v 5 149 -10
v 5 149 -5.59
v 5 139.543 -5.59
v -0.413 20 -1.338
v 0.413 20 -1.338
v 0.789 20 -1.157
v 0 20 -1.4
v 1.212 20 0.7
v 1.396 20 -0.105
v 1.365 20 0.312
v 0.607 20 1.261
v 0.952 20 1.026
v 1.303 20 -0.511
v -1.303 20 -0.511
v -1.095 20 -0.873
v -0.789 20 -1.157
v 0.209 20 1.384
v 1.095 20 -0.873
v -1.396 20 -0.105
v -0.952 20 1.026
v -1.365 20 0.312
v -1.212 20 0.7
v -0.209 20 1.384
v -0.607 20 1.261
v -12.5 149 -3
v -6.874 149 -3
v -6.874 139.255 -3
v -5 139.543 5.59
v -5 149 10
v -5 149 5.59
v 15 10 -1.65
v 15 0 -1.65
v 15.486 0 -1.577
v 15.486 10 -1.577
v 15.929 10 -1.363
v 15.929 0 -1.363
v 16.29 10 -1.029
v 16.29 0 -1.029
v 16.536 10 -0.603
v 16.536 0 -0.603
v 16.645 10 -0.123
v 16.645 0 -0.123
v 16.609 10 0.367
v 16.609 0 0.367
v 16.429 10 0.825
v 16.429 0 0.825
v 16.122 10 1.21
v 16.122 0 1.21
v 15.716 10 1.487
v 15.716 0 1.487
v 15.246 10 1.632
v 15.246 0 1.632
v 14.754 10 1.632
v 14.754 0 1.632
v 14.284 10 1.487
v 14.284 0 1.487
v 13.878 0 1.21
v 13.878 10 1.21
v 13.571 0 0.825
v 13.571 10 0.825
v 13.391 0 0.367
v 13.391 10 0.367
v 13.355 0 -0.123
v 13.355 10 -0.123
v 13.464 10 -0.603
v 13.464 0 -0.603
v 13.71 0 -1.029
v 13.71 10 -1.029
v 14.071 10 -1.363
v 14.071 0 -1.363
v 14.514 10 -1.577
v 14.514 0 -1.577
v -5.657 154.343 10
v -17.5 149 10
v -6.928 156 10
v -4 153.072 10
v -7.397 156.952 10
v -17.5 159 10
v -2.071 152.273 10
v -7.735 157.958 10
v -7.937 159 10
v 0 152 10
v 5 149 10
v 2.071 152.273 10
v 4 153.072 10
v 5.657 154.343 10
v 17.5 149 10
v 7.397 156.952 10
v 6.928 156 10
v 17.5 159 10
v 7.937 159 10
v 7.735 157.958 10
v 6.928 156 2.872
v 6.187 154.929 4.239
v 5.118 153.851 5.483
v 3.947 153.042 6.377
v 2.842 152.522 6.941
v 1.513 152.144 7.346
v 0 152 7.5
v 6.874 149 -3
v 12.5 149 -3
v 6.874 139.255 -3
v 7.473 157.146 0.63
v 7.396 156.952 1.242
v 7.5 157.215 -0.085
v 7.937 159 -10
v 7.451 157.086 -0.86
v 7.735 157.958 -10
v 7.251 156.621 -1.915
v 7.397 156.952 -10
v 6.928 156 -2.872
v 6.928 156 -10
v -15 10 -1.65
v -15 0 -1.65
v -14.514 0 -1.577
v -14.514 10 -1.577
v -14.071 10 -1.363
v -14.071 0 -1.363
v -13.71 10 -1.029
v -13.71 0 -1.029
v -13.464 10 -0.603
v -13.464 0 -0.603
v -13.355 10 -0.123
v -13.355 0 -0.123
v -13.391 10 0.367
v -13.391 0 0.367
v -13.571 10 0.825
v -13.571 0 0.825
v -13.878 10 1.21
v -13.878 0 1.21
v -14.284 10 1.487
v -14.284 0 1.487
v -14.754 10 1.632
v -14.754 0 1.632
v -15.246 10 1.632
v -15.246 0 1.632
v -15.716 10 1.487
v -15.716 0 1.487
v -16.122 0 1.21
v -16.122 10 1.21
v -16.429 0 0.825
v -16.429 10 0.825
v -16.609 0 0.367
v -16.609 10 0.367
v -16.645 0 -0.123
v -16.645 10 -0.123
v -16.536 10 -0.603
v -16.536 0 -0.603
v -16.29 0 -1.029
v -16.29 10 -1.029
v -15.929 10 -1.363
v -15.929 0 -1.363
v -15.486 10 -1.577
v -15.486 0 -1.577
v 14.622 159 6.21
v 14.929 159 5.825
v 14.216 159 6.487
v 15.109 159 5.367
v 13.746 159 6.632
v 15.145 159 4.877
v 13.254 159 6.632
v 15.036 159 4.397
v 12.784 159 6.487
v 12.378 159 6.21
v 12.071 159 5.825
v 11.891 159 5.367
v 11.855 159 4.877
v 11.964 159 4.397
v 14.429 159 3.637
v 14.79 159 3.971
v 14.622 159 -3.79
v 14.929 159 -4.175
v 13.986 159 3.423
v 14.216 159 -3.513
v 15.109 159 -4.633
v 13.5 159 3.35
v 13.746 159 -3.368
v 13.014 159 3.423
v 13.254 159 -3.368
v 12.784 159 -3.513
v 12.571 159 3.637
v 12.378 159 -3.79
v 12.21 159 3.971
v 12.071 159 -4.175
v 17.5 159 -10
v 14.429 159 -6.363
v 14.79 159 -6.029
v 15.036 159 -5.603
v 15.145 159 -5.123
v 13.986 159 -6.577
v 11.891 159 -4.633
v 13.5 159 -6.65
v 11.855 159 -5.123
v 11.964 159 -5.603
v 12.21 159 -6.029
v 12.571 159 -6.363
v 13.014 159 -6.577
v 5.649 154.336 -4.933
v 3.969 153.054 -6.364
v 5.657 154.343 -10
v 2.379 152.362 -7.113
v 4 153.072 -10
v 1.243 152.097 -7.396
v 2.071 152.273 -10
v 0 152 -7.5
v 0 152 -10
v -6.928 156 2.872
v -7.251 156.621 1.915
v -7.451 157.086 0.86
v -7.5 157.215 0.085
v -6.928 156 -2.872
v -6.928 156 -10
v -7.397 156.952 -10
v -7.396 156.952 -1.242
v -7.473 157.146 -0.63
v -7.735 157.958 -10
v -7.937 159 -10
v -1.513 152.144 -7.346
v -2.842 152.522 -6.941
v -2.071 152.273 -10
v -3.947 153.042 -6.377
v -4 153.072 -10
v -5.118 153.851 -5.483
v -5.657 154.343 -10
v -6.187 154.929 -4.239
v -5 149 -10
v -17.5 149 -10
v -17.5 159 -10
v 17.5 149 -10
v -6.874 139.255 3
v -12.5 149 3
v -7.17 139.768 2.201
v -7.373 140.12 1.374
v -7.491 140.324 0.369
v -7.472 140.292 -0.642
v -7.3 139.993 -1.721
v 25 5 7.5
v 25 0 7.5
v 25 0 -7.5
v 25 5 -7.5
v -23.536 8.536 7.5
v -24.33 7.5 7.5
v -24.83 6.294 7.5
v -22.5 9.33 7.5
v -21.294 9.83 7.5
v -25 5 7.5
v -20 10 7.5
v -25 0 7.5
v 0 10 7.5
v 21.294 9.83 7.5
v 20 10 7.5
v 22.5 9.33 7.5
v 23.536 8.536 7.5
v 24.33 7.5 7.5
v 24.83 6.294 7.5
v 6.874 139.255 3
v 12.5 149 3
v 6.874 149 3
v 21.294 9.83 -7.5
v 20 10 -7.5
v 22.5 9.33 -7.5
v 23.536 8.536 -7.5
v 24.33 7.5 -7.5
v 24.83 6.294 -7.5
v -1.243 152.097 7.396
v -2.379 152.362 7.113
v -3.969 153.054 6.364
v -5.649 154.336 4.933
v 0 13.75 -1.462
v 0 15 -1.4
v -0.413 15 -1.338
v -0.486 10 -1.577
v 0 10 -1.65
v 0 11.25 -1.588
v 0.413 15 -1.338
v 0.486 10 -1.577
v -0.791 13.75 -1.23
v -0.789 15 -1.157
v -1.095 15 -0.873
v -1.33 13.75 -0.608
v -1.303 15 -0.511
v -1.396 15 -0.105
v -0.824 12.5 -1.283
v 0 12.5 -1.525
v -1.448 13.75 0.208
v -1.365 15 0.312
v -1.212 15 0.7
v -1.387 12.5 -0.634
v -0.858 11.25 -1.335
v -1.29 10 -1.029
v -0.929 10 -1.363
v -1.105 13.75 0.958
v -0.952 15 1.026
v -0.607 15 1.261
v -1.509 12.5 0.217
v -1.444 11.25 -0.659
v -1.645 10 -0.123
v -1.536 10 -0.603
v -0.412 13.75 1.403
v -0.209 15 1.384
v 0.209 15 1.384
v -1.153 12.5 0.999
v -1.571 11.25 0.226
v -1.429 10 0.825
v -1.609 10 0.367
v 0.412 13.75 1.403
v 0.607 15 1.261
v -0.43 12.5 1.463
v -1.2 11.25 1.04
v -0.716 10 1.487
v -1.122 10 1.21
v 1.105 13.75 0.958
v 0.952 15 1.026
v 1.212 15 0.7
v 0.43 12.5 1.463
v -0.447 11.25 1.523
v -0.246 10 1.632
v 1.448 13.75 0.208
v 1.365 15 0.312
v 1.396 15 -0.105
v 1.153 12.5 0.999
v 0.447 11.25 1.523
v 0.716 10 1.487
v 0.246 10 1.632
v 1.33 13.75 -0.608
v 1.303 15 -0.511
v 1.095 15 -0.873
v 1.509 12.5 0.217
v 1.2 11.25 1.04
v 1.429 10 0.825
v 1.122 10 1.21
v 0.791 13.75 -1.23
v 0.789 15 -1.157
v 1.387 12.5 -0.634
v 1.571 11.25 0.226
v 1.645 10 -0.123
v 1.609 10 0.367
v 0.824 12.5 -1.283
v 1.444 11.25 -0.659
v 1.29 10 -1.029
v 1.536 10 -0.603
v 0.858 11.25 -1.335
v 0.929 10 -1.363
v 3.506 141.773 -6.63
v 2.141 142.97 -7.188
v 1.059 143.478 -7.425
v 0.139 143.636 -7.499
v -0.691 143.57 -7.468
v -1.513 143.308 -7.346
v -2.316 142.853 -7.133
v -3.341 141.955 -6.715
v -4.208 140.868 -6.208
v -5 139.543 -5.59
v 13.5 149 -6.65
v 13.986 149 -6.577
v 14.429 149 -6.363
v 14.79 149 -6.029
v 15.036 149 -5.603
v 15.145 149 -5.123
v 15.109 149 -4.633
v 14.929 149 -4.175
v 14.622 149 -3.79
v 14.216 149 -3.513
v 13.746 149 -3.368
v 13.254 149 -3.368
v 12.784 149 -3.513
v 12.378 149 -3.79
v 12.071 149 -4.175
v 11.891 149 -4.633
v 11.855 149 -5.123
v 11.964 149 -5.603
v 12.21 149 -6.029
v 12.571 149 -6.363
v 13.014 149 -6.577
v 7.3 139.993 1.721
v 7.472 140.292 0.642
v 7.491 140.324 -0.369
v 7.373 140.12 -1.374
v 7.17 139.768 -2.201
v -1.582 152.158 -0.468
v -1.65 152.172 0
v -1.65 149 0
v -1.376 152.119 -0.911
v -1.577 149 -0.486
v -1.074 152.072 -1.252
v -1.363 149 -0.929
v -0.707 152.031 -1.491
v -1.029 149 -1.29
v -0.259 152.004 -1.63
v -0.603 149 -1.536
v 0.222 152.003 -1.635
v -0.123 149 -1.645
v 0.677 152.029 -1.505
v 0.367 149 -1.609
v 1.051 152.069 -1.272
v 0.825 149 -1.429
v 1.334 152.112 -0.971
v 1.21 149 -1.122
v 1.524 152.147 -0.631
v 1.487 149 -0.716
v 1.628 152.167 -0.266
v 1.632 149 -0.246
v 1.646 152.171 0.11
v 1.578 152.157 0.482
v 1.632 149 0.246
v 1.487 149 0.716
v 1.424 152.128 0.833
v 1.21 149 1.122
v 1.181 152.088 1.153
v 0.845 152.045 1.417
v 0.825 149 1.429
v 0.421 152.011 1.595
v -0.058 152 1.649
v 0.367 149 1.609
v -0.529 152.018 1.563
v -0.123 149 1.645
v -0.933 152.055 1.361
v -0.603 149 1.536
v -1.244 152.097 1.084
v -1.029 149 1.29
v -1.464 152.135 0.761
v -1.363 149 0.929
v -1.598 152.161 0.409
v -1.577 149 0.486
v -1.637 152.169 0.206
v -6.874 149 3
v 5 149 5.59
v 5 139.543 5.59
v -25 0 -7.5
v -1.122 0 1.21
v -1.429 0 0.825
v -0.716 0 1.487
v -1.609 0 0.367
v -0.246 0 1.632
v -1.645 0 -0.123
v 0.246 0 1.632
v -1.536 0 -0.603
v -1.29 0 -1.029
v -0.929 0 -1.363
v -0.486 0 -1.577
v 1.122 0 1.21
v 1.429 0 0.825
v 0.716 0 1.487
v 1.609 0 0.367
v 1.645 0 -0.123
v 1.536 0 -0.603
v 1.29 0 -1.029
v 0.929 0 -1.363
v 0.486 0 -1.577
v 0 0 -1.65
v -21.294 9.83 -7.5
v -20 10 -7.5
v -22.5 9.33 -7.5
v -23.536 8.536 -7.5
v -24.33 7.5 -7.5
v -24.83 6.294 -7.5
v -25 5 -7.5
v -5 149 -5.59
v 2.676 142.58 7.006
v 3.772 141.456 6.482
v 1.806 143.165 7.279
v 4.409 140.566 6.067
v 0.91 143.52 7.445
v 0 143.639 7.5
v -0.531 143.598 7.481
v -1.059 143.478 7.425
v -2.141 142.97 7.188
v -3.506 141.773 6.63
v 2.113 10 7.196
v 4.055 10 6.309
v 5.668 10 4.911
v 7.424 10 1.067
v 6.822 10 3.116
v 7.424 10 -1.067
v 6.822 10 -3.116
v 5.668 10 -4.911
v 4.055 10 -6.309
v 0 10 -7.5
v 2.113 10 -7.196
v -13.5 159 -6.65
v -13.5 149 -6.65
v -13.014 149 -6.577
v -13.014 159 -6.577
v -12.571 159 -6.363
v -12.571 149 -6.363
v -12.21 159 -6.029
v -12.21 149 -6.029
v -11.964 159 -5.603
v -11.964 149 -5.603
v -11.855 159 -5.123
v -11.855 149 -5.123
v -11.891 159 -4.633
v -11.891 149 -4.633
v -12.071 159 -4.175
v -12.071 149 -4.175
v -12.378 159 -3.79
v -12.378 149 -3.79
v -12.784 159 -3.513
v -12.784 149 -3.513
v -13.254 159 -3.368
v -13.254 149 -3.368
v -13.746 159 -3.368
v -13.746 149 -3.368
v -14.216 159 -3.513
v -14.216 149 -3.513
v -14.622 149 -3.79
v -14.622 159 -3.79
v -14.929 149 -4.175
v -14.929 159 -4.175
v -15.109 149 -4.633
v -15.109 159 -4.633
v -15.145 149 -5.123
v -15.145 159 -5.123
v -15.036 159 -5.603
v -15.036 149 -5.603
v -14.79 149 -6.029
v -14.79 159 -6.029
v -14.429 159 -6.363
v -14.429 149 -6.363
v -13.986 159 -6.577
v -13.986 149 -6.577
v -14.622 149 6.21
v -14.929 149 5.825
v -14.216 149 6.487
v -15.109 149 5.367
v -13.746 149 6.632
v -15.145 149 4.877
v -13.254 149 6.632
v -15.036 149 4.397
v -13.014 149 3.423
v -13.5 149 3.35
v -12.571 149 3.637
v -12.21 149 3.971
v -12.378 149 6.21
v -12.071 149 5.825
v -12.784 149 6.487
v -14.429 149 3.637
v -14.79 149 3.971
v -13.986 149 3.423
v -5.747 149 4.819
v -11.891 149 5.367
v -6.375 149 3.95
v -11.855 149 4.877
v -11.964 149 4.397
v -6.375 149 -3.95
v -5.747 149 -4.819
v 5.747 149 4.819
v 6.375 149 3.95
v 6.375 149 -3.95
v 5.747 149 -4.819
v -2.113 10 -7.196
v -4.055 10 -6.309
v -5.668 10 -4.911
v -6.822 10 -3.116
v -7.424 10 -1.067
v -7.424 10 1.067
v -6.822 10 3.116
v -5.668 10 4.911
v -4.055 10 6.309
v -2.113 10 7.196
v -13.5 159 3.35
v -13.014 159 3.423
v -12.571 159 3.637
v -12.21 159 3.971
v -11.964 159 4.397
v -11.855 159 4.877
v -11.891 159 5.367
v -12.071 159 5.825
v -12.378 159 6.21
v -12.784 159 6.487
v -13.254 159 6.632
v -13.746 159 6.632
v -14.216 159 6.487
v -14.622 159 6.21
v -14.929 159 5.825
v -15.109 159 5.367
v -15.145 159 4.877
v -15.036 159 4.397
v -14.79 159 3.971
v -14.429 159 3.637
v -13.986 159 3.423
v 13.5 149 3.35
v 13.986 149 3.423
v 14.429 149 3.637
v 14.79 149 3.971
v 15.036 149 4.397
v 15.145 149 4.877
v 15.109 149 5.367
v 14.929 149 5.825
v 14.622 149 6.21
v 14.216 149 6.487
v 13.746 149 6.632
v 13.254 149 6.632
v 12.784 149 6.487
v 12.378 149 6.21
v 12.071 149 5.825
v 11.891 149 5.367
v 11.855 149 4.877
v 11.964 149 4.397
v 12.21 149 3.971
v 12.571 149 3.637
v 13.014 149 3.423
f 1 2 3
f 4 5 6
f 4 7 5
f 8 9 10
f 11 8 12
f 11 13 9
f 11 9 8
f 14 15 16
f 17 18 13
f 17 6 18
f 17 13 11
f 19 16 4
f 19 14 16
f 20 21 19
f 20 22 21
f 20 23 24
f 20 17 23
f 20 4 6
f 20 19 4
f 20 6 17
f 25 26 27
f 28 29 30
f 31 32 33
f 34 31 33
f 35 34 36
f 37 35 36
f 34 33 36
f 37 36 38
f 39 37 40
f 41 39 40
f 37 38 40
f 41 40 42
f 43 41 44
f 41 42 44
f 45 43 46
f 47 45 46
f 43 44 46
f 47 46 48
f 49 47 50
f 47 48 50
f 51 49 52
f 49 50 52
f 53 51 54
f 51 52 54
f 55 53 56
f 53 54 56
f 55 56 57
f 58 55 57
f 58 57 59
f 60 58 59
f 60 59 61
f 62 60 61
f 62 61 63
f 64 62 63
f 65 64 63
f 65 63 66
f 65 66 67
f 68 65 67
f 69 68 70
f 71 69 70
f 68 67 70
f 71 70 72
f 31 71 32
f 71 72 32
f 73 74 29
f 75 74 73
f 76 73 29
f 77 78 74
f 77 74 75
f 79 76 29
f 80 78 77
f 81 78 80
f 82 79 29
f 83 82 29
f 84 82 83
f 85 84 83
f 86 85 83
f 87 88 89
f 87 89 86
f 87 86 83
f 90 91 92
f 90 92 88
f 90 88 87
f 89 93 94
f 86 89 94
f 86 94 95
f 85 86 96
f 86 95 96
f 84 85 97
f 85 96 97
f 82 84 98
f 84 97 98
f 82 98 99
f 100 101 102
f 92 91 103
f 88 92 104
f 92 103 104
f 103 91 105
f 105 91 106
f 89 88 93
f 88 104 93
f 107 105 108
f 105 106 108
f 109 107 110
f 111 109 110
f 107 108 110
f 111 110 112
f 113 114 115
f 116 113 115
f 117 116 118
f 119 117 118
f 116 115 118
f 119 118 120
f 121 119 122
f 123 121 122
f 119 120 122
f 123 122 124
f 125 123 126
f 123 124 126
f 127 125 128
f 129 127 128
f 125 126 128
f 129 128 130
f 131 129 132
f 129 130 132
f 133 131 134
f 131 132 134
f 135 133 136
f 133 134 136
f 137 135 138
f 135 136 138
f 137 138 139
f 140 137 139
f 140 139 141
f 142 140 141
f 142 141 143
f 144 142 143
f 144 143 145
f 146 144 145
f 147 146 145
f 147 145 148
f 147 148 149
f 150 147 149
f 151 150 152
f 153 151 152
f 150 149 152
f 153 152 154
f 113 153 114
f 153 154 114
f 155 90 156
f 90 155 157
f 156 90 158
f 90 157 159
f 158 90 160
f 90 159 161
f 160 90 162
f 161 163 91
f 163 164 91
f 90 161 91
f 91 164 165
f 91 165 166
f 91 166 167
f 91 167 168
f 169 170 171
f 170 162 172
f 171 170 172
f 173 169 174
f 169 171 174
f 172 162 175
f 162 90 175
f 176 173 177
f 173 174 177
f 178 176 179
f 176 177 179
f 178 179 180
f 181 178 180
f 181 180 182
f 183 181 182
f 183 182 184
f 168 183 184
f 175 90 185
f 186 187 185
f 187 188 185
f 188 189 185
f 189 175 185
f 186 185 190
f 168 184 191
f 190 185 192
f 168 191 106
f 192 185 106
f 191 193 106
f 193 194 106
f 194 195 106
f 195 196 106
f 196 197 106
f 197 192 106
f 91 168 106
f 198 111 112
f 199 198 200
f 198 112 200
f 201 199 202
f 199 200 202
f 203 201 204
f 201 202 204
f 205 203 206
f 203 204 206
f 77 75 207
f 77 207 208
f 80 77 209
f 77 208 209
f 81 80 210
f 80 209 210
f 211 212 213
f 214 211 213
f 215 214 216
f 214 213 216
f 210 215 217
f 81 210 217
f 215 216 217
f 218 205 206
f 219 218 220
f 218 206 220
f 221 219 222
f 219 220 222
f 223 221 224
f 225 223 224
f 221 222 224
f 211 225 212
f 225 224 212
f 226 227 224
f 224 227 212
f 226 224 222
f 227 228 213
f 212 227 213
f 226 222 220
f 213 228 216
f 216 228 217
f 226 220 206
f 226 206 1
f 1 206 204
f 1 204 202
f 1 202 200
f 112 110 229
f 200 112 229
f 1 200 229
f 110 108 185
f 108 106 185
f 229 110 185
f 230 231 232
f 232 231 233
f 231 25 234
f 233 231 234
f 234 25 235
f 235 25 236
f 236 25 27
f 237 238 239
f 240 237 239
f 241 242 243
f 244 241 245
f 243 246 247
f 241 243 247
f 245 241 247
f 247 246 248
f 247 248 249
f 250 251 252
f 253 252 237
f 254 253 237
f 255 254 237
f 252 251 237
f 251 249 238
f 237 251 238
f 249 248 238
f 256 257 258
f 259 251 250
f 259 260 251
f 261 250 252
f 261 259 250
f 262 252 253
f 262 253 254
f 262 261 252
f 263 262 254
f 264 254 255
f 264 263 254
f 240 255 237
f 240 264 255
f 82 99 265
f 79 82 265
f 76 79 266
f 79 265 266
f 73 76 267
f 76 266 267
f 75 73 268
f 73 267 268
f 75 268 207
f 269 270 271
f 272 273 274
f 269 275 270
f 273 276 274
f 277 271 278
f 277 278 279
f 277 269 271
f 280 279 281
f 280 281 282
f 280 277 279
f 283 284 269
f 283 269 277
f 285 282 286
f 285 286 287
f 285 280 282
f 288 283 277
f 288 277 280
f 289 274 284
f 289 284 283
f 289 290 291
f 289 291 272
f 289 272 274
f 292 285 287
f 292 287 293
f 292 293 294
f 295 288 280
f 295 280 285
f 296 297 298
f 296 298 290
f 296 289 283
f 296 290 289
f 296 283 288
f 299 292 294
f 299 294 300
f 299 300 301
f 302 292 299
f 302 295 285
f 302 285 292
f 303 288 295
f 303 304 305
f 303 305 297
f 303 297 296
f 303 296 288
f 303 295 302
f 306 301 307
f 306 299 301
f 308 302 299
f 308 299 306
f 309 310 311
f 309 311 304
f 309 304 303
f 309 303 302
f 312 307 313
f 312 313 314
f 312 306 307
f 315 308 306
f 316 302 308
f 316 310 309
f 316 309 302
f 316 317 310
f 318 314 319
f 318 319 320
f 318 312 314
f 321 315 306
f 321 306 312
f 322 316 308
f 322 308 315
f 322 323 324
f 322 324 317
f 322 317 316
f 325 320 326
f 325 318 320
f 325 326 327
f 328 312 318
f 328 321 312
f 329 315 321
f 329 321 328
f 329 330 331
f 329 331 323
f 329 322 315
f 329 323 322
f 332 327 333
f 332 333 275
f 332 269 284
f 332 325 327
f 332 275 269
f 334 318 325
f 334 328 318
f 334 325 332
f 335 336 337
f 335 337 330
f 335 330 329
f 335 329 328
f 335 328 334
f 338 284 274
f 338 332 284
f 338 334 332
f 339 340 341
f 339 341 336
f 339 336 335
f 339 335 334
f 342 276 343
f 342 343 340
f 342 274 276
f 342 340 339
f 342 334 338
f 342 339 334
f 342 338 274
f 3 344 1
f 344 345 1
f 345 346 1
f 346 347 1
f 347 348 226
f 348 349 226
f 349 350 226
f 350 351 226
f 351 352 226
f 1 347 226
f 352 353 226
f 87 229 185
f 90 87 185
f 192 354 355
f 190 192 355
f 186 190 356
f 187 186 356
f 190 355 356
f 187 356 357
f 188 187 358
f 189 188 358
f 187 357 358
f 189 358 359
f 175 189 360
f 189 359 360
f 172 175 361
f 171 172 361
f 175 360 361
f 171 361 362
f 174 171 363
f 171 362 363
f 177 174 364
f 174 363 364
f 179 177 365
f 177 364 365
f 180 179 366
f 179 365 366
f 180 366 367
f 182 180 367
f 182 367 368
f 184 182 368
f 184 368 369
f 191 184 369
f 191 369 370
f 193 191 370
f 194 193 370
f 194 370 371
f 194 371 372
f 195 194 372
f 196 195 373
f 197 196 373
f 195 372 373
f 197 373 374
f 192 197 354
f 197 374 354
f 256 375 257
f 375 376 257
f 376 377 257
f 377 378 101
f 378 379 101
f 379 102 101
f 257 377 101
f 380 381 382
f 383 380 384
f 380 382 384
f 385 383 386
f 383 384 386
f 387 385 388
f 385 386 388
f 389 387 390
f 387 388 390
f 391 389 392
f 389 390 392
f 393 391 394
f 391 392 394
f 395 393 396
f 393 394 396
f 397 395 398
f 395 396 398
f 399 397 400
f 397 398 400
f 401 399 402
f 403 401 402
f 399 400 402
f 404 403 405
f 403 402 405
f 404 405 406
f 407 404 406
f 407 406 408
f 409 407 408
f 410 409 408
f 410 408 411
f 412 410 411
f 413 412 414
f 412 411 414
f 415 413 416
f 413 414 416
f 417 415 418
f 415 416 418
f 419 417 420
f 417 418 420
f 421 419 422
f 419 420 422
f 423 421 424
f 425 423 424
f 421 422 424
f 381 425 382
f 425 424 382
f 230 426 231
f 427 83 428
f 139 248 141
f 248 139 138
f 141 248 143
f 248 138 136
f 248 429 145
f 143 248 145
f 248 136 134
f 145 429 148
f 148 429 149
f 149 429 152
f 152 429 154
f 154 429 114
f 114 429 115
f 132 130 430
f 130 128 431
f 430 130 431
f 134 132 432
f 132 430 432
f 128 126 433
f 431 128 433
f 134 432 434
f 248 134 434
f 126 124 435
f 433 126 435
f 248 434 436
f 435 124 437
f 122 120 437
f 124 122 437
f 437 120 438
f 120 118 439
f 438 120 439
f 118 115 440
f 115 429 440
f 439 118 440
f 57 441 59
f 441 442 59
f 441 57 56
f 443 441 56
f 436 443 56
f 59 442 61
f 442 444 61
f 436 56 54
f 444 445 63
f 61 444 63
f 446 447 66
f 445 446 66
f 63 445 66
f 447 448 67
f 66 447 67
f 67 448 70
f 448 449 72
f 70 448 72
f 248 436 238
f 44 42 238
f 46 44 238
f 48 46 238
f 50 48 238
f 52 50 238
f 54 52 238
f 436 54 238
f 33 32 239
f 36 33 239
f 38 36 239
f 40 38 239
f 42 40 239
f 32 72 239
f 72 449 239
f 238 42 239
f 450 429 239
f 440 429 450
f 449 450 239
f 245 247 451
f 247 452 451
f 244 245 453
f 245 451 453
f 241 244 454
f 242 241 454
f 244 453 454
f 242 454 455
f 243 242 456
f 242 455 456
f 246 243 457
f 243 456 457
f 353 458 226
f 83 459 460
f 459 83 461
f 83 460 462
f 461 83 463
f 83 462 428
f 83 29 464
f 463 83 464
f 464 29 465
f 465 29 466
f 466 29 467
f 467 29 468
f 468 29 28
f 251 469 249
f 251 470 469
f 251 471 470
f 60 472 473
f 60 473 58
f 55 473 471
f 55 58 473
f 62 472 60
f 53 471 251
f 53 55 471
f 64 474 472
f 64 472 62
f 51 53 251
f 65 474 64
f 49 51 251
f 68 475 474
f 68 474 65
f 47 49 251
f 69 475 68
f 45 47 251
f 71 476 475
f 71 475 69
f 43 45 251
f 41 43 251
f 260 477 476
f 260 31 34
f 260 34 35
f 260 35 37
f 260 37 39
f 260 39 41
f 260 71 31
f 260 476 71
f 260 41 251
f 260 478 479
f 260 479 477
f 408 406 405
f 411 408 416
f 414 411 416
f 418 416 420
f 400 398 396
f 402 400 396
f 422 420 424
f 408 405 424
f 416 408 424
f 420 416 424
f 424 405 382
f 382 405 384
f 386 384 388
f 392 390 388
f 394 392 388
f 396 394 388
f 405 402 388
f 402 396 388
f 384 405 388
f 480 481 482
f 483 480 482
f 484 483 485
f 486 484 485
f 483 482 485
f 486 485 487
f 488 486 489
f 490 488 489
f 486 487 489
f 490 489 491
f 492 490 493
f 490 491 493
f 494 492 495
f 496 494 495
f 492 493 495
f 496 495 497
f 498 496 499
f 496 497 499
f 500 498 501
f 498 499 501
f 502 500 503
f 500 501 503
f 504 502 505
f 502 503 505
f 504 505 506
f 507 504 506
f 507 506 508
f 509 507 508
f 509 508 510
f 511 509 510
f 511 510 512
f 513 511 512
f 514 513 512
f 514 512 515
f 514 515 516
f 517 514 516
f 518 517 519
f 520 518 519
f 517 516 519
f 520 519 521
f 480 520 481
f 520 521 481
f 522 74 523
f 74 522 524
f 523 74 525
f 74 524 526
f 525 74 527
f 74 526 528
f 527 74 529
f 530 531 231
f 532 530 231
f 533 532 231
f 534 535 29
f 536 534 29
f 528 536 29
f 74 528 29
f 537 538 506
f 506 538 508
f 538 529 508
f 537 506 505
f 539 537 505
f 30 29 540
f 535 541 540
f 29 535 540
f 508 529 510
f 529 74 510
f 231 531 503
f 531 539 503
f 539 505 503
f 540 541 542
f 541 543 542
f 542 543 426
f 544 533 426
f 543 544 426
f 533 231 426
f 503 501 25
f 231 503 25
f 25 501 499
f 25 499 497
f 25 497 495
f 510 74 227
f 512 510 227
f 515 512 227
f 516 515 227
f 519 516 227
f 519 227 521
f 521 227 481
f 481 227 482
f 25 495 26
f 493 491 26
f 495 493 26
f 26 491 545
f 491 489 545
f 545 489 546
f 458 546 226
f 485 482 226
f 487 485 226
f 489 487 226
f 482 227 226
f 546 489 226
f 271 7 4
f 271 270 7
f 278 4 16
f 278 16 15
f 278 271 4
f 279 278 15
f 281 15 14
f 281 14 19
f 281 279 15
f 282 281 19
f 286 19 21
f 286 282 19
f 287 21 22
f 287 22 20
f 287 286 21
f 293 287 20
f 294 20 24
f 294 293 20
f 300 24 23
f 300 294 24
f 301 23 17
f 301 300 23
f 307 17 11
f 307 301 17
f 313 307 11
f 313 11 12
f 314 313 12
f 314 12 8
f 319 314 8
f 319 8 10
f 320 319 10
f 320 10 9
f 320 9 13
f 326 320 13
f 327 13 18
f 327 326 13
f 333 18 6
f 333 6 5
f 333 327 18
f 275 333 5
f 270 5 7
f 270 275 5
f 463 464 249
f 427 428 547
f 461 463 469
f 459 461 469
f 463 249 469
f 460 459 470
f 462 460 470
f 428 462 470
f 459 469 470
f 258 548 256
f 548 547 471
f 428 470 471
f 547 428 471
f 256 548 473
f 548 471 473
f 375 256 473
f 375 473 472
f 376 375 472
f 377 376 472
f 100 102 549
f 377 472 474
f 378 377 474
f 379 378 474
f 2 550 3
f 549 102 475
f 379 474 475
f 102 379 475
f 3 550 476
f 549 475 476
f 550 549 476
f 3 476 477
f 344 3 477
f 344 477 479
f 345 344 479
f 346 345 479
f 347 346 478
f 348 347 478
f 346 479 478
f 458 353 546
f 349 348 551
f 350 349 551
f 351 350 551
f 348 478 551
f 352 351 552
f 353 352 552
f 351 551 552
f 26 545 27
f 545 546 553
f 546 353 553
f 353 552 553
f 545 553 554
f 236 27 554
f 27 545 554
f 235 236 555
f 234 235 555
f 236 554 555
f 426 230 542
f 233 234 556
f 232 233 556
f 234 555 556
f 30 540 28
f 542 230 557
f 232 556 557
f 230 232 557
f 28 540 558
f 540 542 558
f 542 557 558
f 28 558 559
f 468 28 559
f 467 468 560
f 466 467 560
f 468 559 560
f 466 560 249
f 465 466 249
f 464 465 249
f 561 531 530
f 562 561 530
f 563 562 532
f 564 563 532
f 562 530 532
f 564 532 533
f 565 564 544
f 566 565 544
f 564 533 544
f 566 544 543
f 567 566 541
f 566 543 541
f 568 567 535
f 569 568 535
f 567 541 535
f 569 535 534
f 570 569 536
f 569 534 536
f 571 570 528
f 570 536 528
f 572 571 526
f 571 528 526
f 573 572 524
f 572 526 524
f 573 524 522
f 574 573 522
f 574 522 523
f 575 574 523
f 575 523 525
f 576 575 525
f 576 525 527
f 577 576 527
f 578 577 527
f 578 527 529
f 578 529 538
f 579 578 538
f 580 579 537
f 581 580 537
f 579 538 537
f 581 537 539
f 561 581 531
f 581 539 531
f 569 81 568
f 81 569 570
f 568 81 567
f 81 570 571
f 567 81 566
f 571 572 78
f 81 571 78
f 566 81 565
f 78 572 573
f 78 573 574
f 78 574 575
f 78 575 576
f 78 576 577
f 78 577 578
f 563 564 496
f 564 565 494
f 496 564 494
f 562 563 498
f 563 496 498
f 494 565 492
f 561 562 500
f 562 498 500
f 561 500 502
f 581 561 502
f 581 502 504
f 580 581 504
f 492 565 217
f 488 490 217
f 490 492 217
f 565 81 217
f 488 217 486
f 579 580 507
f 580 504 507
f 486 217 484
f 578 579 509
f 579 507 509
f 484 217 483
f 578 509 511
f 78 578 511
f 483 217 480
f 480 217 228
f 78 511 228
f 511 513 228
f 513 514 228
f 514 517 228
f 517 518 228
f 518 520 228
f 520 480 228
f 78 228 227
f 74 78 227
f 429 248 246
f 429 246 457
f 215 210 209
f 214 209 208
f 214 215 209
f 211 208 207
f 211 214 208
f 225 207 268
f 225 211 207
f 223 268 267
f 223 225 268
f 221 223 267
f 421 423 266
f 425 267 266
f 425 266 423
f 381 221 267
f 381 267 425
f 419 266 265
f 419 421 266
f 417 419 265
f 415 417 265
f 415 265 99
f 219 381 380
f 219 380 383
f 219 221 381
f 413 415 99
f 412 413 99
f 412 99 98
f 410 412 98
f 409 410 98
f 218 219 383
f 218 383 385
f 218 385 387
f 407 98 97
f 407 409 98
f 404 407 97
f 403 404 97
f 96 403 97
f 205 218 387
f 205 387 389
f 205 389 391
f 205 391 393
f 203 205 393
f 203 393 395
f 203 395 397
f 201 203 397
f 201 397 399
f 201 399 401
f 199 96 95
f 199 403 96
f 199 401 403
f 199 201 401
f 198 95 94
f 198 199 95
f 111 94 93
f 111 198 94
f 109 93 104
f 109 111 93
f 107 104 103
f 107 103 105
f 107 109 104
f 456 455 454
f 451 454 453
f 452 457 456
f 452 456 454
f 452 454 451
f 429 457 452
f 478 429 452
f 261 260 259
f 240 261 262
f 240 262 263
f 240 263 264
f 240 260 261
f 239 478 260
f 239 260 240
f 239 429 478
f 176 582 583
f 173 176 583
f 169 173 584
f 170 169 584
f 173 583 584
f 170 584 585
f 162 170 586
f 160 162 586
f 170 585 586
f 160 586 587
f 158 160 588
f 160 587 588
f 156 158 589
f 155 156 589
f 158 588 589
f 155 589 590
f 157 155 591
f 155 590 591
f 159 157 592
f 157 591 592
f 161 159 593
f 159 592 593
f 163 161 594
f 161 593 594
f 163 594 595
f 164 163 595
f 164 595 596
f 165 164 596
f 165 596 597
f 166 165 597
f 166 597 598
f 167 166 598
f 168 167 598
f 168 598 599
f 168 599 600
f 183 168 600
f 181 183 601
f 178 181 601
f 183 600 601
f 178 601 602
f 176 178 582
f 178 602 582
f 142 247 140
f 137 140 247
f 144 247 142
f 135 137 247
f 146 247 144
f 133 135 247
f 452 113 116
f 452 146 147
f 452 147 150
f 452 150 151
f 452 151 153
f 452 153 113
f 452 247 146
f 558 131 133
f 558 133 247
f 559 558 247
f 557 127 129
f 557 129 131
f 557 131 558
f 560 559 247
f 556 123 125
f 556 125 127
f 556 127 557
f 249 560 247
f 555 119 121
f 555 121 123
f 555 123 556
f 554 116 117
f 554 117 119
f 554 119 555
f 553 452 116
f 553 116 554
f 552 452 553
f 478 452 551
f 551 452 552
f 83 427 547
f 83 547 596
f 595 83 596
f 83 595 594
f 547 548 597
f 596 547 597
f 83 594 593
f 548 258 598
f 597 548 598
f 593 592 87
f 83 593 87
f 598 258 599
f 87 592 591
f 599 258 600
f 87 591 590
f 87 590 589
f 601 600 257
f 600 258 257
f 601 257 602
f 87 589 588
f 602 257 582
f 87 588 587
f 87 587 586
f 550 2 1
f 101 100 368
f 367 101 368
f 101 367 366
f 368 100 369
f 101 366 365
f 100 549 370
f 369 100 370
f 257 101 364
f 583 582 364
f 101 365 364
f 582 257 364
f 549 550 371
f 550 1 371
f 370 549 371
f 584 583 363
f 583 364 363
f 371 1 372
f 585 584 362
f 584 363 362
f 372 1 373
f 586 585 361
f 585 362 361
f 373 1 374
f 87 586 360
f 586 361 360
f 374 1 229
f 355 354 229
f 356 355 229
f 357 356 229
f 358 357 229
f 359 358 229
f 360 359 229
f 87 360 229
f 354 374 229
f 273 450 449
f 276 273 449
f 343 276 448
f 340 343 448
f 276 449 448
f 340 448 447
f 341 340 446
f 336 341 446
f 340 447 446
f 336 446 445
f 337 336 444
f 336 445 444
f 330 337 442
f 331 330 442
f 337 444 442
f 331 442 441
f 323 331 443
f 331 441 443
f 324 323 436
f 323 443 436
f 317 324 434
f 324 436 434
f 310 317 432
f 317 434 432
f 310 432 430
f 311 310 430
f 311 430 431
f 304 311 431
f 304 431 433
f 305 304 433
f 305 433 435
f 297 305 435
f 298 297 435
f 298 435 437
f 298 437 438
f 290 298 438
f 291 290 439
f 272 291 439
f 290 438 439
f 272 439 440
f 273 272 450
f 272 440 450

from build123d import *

# Parameters (mm, degrees)
SKETCH_1_W               = 50
SKETCH_1_H               = 15
EXTRUDE_1_DEPTH          = 10
SKETCH_2_R               = 7.5
EXTRUDE_2_DEPTH          = 150
EXTRUDE_3_DEPTH          = 10
EXTRUDE_3_DEPTH_BACK     = 10
CUT_EXTRUDE_2_DEPTH      = 100
CUT_EXTRUDE_2_DEPTH_BACK = 100
SKETCH_5_R               = 1.65
CUT_EXTRUDE_3_DEPTH      = 10
FILLET_1_R               = 5
SKETCH_7_R               = 1.65
CUT_EXTRUDE_4_DEPTH      = 10
EXTRUDE_6_DEPTH          = 3
EXTRUDE_6_DEPTH_BACK     = 3
EXTRUDE_7_DEPTH          = 5
EXTRUDE_7_DEPTH_BACK     = 5


with BuildPart() as part:
    # 草图1 → 凸台-拉伸1 (new body)
    with BuildSketch(Plane(origin=(0, 0, 0), x_dir=(1, 0, 0), z_dir=(0, 1, 0))):
        Rectangle(SKETCH_1_W, SKETCH_1_H)
    extrude(amount=EXTRUDE_1_DEPTH)

    # 草图2 → 凸台-拉伸2 (add)
    with BuildSketch(Plane(origin=(0, 10, 0), x_dir=(1, 0, 0), z_dir=(0, 1, 0))):
        with Locations(Location((0, 0, 0), (0, 0, 270))):
            Circle(SKETCH_2_R)
    extrude(amount=EXTRUDE_2_DEPTH)

    # 草图3 → 凸台-拉伸3 (add, two sides: drawn at the far end of the back side and taken through both)
    with BuildSketch(Plane.XY.offset(-EXTRUDE_3_DEPTH_BACK)):
        with BuildLine():
            ThreePointArc((-10.246950766, 156), (-10.706300052, 157.4750962), (-10.95445115, 159))
            Line((-10.95445115, 159), (-17.5, 159))
            Line((-17.5, 159), (-17.5, 156))
            Line((-17.5, 156), (-10.246950766, 156))
        make_face()
        with BuildLine():
            ThreePointArc((-6.92820323, 156), (-7.582575695, 157.449598888), (-7.937253933, 159))
            Line((-7.937253933, 159), (-10.95445115, 159))
            ThreePointArc((-10.95445115, 159), (-10.706300052, 157.4750962), (-10.246950766, 156))
            Line((-10.246950766, 156), (-6.92820323, 156))
        make_face()
        with BuildLine():
            Line((10.95445115, 159), (7.937253933, 159))
            ThreePointArc((7.937253933, 159), (7.582575695, 157.449598888), (6.92820323, 156))
            Line((6.92820323, 156), (10.246950766, 156))
            ThreePointArc((10.246950766, 156), (10.706300052, 157.4750962), (10.95445115, 159))
        make_face()
        with BuildLine():
            ThreePointArc((6.92820323, 156), (4, 153.07179677), (0, 152))
            Line((0, 152), (0, 149))
            ThreePointArc((0, 149), (6.204836823, 150.917048938), (10.246950766, 156))
            Line((10.246950766, 156), (6.92820323, 156))
        make_face()
        with BuildLine():
            Line((0, 149), (0, 152))
            ThreePointArc((0, 152), (-4, 153.07179677), (-6.92820323, 156))
            Line((-6.92820323, 156), (-10.246950766, 156))
            ThreePointArc((-10.246950766, 156), (-6.204836823, 150.917048938), (0, 149))
        make_face()
        with BuildLine():
            Line((17.5, 159), (10.95445115, 159))
            ThreePointArc((10.95445115, 159), (10.706300052, 157.4750962), (10.246950766, 156))
            Line((10.246950766, 156), (17.5, 156))
            Line((17.5, 156), (17.5, 159))
        make_face()
        with BuildLine():
            Line((-17.5, 149), (0, 149))
            ThreePointArc((0, 149), (-6.204836823, 150.917048938), (-10.246950766, 156))
            Line((-10.246950766, 156), (-17.5, 156))
            Line((-17.5, 156), (-17.5, 149))
        make_face()
        with BuildLine():
            ThreePointArc((10.246950766, 156), (6.204836823, 150.917048938), (0, 149))
            Line((0, 149), (17.5, 149))
            Line((17.5, 149), (17.5, 156))
            Line((17.5, 156), (10.246950766, 156))
        make_face()
    extrude(amount=EXTRUDE_3_DEPTH + EXTRUDE_3_DEPTH_BACK)

    # 草图4 → 切除-拉伸2 (cut, two sides: drawn at the far end of the back side and taken through both)
    with BuildSketch(Plane.XY.offset(-CUT_EXTRUDE_2_DEPTH_BACK)):
        with BuildLine():
            Line((8, 160), (-8, 160))
            ThreePointArc((-8, 160), (-7.899200485, 158.734049095), (-7.599342077, 157.5))
            Line((-7.599342077, 157.5), (7.599342077, 157.5))
            ThreePointArc((7.599342077, 157.5), (7.899200485, 158.734049095), (8, 160))
        make_face()
        with BuildLine():
            Line((7.599342077, 157.5), (-7.599342077, 157.5))
            ThreePointArc((-7.599342077, 157.5), (0, 152), (7.599342077, 157.5))
        make_face()
    extrude(amount=CUT_EXTRUDE_2_DEPTH + CUT_EXTRUDE_2_DEPTH_BACK, mode=Mode.SUBTRACT)

    # 草图5 → 切除-拉伸3 (cut)
    with BuildSketch(Plane.XZ):
        with Locations(Location((0, 0, 0), (0, 0, 270))):
            Circle(SKETCH_5_R)
        with Locations(Location((-15, 0, 0), (0, 0, 270))):
            Circle(SKETCH_5_R)
        with Locations(Location((15, 0, 0), (0, 0, 270))):
            Circle(SKETCH_5_R)
    extrude(amount=-CUT_EXTRUDE_3_DEPTH, mode=Mode.SUBTRACT)

    # 草图6 → 切除-旋转1 (revolve, cut)
    with BuildSketch(Plane.XY, mode=Mode.PRIVATE) as cut_revolve_1_sk:
        Polygon((0, 10), (0, 20), (1.4, 20), (1.4, 15), (1.65, 10), align=None)
    revolve(cut_revolve_1_sk.sketch.rotate(Axis((0, 10, 0), (0, 1, 0)), 90), axis=Axis((0, 10, 0), (0, 1, 0)), mode=Mode.SUBTRACT)

    # 圆角1
    fillet_1_edges = [part.edges().sort_by_distance(p)[0] for p in [
        (-25, 10, 0),
        (25, 10, 0),
    ]]
    fillet(fillet_1_edges, radius=FILLET_1_R)

    # 草图9 → 切除-旋转2 (revolve, cut)
    with BuildSketch(Plane.XY, mode=Mode.PRIVATE) as cut_revolve_2_sk:
        Polygon((0, 152), (0, 153.423684137), (1.65, 153.423684137), (1.65, 149), (1.4, 144.61976638), (0, 144.61976638), (0, 149), align=None)
    revolve(cut_revolve_2_sk.sketch.rotate(Axis((0, 152, 0), (0, -1, 0)), 180), axis=Axis((0, 152, 0), (0, -1, 0)), mode=Mode.SUBTRACT)

    # 草图7 → 切除-拉伸4 (cut)
    with BuildSketch(Plane.XZ.offset(-149)):
        with Locations(Location((-13.5, 5, 0), (0, 0, 270))):
            Circle(SKETCH_7_R)
        with Locations(Location((-13.5, -5, 0), (0, 0, 270))):
            Circle(SKETCH_7_R)
        with Locations(Location((13.5, 5, 0), (0, 0, 270))):
            Circle(SKETCH_7_R)
        with Locations(Location((13.5, -5, 0), (0, 0, 270))):
            Circle(SKETCH_7_R)
    extrude(amount=-CUT_EXTRUDE_4_DEPTH, mode=Mode.SUBTRACT)

    # 草图10 → 凸台-拉伸6 (add, two sides: drawn at the far end of the back side and taken through both)
    with BuildSketch(Plane.XY.offset(-EXTRUDE_6_DEPTH_BACK)):
        Polygon((-12.5, 149), (-7.5, 149), (-7.5, 140.339745962), align=None)
        Polygon((0, 127.349364905), (0, 149), (-7.5, 149), (-7.5, 140.339745962), align=None)
        Polygon((7.5, 140.339745962), (7.5, 149), (0, 149), (0, 127.349364905), align=None)
        Polygon((7.5, 140.339745962), (12.5, 149), (7.5, 149), align=None)
    extrude(amount=EXTRUDE_6_DEPTH + EXTRUDE_6_DEPTH_BACK)

    # 草图11 → 凸台-拉伸7 (add, two sides: drawn at the far end of the back side and taken through both)
    with BuildSketch(Plane(origin=(0, 0, 0), x_dir=(0, 0, -1), z_dir=(1, 0, 0)).offset(-EXTRUDE_7_DEPTH_BACK)):
        Polygon((0, 149), (-10, 149), (0, 127.554930795), align=None)
        Polygon((10, 149), (0, 149), (0, 127.554930795), align=None)
    extrude(amount=EXTRUDE_7_DEPTH + EXTRUDE_7_DEPTH_BACK)


solid = part.part
